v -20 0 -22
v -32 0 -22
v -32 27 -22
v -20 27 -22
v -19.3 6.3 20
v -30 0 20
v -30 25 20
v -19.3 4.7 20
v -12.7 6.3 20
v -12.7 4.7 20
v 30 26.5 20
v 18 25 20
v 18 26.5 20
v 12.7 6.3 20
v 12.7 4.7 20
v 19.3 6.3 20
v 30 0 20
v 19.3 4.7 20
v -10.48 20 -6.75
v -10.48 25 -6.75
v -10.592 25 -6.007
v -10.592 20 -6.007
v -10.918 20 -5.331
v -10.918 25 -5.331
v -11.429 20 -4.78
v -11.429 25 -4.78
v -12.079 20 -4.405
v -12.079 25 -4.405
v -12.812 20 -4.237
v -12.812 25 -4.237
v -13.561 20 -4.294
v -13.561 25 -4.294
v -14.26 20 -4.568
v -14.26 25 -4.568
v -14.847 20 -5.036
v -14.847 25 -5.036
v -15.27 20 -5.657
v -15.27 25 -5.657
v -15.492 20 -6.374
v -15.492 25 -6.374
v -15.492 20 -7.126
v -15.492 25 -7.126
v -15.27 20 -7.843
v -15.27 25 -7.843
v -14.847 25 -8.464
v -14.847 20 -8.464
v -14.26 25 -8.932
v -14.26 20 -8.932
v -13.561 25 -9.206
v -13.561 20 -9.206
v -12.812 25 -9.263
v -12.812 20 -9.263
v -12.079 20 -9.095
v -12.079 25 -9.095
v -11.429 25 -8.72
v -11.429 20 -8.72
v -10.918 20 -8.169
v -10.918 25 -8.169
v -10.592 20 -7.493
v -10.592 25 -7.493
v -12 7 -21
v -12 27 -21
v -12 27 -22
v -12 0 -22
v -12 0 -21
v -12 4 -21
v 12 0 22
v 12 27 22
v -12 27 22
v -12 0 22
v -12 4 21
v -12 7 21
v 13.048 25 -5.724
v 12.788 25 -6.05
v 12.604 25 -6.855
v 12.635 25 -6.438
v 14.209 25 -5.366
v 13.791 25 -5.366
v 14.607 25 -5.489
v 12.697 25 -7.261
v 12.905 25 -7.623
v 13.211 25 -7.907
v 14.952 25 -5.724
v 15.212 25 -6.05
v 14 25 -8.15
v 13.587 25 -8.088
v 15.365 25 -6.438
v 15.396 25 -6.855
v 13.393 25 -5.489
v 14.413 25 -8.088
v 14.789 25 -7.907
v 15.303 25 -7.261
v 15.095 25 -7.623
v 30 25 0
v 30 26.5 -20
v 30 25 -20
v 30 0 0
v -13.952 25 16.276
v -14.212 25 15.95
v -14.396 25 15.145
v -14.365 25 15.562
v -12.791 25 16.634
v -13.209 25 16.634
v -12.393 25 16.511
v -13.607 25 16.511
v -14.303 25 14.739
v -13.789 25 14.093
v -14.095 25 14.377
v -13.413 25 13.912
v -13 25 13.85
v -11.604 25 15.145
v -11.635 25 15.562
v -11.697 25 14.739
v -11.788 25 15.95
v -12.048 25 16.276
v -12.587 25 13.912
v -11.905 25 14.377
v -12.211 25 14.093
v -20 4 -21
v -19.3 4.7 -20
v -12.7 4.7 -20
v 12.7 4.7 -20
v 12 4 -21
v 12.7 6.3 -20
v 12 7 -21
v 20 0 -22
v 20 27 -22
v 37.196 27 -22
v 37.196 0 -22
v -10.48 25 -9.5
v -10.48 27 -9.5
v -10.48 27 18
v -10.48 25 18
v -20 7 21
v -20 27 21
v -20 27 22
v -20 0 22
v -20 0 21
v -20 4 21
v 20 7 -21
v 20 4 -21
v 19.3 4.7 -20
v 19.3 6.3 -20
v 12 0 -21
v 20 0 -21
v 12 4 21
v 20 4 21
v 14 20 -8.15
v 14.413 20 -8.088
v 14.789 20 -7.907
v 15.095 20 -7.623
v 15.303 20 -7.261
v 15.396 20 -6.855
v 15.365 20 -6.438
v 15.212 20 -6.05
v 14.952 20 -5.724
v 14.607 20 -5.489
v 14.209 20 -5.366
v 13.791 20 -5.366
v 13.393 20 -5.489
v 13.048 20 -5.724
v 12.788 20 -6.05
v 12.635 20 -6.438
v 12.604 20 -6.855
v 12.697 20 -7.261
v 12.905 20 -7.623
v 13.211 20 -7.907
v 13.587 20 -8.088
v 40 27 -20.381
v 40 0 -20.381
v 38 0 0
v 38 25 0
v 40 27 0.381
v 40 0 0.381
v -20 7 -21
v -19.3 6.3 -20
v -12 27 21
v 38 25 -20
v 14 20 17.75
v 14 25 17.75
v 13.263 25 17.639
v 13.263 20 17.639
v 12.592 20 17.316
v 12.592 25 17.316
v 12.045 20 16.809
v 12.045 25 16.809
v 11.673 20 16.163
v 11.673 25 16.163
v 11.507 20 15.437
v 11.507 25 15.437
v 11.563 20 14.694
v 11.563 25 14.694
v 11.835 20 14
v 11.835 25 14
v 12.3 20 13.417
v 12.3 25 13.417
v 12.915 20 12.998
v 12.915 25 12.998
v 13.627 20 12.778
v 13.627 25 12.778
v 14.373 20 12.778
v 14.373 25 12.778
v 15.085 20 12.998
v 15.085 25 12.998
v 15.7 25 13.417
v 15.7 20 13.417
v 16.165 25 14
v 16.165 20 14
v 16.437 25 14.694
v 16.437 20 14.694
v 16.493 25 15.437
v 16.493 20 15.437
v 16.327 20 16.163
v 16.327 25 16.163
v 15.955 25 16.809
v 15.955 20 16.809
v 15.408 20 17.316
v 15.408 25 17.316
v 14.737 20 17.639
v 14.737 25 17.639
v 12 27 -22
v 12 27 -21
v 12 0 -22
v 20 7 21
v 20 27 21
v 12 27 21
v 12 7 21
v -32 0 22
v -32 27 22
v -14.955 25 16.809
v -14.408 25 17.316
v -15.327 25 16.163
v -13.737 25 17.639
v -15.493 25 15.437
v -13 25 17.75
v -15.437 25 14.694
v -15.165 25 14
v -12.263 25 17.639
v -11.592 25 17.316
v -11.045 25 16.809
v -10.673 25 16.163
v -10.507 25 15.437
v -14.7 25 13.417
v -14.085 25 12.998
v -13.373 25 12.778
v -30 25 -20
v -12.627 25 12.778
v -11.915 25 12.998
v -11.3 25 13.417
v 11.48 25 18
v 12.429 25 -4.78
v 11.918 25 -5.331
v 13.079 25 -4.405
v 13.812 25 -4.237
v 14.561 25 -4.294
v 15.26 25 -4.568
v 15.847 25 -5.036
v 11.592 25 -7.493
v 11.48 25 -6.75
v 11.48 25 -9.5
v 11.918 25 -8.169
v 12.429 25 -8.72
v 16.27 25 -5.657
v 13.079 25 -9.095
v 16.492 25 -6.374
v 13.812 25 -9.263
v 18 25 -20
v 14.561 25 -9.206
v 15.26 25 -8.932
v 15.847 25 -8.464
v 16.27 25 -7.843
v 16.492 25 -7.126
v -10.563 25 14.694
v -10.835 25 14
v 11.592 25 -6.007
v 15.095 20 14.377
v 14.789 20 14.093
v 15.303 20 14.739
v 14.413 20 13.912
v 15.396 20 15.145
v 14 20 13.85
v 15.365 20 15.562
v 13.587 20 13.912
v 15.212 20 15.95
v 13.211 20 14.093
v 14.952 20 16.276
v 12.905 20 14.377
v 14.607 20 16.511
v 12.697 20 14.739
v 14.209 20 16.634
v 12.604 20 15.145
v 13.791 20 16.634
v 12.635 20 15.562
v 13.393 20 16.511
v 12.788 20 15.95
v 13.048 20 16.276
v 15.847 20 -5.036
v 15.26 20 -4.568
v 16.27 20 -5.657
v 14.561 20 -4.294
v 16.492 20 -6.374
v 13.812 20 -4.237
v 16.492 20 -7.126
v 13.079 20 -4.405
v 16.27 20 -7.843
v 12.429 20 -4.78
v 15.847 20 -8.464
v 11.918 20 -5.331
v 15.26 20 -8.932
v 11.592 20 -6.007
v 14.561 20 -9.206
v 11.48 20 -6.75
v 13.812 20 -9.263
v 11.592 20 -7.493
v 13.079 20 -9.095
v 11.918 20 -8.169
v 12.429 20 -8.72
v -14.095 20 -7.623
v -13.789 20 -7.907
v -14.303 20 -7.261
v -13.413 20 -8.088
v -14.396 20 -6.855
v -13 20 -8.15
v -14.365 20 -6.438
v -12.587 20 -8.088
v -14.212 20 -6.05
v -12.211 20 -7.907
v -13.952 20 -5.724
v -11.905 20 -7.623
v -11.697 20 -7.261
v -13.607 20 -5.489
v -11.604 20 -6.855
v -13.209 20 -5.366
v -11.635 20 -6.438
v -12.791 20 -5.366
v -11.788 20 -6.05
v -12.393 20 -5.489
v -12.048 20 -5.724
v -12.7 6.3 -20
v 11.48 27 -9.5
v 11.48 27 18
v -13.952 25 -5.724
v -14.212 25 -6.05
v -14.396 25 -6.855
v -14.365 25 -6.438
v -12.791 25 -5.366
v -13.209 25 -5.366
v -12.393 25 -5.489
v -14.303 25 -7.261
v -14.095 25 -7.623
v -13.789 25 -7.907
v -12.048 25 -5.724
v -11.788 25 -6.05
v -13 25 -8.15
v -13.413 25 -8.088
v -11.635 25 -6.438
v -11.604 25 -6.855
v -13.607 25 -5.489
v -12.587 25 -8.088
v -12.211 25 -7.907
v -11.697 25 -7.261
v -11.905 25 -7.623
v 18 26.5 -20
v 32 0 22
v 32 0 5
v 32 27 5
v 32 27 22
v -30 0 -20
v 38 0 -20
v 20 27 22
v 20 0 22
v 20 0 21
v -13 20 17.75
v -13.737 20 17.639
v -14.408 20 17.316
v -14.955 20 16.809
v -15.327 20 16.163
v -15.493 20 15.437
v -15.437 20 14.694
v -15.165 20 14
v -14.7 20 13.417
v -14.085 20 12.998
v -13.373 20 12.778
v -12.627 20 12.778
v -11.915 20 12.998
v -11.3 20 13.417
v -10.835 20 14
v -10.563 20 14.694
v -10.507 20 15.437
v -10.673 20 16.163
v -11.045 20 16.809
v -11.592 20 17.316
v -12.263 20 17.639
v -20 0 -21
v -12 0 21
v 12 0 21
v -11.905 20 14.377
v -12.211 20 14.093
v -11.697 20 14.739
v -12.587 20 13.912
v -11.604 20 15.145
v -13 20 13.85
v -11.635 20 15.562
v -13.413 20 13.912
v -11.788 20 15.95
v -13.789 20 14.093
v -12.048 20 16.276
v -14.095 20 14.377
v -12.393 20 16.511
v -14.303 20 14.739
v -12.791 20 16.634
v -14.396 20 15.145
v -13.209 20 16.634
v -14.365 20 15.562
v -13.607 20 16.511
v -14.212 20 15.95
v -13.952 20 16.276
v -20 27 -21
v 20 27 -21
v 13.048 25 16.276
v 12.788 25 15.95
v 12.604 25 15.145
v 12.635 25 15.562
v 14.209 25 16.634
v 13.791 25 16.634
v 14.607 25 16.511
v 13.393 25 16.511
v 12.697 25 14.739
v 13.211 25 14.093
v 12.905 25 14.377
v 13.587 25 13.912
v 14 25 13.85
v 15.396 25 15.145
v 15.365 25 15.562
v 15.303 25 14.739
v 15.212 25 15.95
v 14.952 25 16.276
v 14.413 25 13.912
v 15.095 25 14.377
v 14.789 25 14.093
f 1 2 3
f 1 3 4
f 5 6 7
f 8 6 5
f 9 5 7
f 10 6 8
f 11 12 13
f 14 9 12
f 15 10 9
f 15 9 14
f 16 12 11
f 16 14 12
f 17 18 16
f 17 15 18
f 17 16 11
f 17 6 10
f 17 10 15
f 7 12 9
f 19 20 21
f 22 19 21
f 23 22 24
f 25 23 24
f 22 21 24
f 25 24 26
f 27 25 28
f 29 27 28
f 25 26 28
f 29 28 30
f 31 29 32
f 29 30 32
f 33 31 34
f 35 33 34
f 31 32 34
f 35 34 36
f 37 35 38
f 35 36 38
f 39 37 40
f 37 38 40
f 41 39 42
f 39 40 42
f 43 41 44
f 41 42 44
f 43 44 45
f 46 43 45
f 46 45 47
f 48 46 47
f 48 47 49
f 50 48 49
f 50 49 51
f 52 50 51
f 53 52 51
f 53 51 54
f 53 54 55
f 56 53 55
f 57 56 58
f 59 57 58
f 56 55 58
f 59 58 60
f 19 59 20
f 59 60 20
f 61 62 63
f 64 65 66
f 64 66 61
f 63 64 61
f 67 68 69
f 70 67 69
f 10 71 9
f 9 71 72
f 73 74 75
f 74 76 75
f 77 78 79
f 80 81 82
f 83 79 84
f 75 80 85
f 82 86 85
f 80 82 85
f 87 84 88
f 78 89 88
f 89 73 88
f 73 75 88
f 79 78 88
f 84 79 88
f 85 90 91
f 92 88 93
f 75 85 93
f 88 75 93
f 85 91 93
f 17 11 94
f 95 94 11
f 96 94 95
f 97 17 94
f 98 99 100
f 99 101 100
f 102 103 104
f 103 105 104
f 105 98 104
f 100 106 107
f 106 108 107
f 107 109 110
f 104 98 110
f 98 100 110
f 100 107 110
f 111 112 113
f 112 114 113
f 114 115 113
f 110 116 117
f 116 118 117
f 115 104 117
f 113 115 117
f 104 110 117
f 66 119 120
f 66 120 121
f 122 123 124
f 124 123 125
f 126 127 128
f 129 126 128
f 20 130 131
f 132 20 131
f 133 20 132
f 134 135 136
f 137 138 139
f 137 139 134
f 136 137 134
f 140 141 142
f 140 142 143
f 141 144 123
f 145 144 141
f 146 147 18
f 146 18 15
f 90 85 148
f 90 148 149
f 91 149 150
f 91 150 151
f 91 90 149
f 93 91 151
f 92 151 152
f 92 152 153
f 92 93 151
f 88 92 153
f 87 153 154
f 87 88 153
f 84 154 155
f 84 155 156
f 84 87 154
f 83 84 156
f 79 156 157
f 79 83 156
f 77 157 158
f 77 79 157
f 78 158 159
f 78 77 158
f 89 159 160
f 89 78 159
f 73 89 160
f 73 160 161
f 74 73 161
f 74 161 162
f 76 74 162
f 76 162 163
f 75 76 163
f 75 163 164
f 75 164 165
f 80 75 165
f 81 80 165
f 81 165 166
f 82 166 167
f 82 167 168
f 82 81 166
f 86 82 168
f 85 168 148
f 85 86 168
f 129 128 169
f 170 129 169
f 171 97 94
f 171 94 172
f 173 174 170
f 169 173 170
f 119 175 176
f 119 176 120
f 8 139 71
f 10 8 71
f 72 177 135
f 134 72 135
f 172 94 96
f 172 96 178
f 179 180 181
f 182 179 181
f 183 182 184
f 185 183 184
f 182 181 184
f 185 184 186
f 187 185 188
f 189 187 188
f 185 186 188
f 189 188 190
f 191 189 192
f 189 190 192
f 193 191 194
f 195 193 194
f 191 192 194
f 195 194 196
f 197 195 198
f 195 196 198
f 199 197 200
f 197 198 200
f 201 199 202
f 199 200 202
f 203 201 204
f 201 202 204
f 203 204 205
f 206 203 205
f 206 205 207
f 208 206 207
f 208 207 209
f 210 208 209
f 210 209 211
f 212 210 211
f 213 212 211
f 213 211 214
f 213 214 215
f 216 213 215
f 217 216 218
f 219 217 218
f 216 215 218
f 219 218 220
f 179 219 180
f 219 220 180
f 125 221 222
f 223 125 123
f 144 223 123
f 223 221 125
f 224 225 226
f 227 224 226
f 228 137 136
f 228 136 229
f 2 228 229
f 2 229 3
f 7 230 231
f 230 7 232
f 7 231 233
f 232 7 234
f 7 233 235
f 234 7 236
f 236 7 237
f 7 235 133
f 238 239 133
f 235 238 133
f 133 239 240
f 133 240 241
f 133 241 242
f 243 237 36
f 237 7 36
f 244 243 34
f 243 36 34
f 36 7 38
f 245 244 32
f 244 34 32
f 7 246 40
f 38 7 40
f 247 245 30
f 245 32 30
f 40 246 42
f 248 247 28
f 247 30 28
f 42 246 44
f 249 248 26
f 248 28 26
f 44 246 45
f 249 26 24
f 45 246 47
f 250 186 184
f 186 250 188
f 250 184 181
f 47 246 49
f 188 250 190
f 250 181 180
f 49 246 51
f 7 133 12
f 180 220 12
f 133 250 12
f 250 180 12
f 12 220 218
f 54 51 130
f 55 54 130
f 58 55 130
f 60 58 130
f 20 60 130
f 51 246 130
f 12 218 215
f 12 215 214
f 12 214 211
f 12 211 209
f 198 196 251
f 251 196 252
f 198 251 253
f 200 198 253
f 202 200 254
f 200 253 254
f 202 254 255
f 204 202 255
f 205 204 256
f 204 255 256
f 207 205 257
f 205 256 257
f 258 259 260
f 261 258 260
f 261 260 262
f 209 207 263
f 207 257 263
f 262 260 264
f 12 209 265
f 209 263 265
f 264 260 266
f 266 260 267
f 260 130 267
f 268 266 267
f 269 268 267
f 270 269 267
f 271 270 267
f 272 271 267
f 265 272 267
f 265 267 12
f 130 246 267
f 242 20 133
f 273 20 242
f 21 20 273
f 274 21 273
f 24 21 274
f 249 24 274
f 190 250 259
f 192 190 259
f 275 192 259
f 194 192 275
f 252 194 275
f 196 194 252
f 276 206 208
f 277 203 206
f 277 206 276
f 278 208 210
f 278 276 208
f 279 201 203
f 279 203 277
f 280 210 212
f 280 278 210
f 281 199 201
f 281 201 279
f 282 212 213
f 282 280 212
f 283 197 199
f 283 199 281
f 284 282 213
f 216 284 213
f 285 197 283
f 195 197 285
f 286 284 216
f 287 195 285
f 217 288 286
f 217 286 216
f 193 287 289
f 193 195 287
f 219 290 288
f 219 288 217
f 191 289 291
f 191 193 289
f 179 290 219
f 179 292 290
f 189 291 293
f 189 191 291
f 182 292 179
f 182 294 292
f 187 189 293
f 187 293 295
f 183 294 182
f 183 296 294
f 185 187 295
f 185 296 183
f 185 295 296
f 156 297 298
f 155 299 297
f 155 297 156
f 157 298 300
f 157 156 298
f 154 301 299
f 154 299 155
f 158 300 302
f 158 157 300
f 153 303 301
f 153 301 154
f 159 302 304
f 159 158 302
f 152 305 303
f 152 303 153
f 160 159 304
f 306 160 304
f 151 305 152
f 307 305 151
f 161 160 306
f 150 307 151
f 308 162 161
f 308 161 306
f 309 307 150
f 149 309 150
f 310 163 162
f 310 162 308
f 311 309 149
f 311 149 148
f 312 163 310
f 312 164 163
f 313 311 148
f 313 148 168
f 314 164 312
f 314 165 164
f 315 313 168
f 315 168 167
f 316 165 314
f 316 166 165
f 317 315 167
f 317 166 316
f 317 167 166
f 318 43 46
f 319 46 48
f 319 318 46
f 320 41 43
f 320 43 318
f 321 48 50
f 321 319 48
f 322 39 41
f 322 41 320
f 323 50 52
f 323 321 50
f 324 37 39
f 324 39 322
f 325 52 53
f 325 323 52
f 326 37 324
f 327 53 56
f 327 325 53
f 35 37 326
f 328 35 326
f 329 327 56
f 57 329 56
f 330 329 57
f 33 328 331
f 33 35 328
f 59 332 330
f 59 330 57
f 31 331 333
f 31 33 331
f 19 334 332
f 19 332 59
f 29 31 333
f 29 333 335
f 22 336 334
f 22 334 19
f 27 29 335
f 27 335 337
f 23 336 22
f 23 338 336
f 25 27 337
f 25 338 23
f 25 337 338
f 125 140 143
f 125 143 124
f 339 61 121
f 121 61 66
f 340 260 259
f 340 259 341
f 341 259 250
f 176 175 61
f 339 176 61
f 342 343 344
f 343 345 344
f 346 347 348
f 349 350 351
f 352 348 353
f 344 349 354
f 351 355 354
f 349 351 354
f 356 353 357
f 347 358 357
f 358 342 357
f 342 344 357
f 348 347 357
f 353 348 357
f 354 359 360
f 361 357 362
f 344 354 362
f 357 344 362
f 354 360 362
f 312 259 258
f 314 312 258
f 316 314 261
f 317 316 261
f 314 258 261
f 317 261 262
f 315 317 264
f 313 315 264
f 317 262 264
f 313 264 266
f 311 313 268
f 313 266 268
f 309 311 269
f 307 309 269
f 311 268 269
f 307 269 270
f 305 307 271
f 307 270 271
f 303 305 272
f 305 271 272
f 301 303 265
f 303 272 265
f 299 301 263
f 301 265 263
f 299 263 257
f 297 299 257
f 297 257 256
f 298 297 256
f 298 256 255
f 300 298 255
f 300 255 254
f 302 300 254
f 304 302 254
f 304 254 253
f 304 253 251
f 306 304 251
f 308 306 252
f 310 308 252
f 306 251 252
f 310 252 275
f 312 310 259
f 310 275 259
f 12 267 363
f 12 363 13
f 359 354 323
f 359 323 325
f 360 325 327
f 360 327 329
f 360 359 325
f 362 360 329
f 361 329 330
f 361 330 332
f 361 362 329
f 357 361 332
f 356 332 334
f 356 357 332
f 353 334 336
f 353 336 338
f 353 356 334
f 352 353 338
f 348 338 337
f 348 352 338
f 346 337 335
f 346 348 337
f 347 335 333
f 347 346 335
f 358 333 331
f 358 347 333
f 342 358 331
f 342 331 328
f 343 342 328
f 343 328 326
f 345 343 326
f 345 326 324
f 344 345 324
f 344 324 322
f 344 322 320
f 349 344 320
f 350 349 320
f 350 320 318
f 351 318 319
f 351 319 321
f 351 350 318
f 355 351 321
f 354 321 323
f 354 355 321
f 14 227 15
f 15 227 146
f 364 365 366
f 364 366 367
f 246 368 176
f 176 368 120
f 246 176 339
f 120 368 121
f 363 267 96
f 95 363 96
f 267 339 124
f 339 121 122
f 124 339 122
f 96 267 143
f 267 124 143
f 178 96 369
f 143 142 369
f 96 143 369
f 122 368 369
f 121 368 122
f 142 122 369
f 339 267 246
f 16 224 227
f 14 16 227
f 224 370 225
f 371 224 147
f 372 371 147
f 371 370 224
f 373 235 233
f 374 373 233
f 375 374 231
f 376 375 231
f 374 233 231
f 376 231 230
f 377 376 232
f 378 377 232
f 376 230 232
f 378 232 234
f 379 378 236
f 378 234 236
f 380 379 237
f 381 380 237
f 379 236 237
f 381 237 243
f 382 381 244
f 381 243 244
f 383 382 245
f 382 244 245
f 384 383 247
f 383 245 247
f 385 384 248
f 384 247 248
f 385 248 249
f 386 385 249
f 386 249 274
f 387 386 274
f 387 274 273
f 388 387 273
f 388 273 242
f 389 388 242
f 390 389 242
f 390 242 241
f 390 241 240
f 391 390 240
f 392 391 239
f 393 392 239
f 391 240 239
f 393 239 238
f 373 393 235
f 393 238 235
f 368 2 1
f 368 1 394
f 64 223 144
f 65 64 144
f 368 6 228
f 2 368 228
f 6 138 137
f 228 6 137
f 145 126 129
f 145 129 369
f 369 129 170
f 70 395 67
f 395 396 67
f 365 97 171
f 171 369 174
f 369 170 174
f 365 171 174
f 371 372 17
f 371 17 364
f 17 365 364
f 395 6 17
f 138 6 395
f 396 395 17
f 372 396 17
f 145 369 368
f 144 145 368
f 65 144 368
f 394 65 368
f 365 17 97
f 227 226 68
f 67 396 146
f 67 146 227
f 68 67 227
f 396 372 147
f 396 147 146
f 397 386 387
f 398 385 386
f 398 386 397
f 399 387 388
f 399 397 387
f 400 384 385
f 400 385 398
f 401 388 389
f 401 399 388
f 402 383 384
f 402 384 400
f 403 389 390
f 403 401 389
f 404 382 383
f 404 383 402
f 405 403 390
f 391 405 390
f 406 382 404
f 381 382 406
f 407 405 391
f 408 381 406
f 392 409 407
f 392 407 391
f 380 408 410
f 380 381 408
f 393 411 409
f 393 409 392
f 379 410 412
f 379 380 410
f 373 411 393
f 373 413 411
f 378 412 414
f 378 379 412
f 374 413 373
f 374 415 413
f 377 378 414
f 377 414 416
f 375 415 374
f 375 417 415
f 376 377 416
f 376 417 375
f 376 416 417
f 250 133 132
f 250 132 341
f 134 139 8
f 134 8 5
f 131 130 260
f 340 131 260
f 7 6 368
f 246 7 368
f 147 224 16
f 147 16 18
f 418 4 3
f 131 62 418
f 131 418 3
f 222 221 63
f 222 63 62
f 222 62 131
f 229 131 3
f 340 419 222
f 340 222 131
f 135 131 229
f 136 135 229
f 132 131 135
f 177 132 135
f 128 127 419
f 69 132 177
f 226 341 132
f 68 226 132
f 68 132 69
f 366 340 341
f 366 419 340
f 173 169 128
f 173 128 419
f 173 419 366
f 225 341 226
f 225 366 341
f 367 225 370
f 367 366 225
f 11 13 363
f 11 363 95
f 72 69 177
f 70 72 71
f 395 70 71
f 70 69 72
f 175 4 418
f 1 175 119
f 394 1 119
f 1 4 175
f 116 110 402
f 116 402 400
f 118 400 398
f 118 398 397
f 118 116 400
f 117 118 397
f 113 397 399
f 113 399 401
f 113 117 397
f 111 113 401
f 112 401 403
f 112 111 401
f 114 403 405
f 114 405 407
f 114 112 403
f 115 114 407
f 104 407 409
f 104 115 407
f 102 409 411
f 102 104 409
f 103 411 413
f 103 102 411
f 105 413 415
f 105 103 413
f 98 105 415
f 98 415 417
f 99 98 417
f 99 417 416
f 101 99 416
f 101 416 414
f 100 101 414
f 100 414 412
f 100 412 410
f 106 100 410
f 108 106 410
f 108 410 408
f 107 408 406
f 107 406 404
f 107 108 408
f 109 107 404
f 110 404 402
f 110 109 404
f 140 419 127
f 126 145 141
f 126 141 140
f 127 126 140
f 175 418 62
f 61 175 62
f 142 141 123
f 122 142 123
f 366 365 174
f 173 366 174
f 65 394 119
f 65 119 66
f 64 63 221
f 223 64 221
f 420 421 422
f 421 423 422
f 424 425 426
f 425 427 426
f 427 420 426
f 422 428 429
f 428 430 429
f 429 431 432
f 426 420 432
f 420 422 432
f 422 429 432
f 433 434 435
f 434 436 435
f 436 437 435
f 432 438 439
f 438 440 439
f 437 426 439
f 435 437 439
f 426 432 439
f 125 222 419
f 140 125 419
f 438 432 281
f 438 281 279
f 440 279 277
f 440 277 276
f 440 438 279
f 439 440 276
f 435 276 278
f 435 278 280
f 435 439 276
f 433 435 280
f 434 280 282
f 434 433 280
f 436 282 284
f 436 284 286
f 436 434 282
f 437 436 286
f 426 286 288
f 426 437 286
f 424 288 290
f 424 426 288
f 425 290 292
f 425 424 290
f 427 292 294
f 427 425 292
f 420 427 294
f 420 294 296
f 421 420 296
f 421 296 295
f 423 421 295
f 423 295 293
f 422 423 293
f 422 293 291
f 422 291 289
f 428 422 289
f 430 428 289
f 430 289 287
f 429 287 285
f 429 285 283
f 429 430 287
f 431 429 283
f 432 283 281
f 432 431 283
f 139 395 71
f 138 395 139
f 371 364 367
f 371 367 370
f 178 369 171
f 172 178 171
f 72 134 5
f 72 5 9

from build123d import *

# Parameters (mm, degrees)
SKETCH1_W               = 60
SKETCH1_H               = 40
BOSS_EXTRUDE1_DEPTH     = 27
SKETCH2_W               = 8
SKETCH2_H               = 3
CUT_EXTRUDE1_DEPTH      = 1
CUT_EXTRUDE1_DRAFT      = -35
MIRROR1_COPY_1_SKETCH_W = 8
MIRROR1_COPY_1_SKETCH_H = 3
MIRROR1_COPY_1_DEPTH    = 1
MIRROR1_COPY_1_DRAFT    = -35
MIRROR2_COPY_1_SKETCH_W = 8
MIRROR2_COPY_1_SKETCH_H = 3
MIRROR2_COPY_1_DEPTH    = 1
MIRROR2_COPY_1_DRAFT    = -35
MIRROR2_COPY_2_SKETCH_W = 8
MIRROR2_COPY_2_SKETCH_H = 3
MIRROR2_COPY_2_DEPTH    = 1
MIRROR2_COPY_2_DRAFT    = -35
BOSS_EXTRUDE2_START     = 27
SKETCH1_3_W             = 60
SKETCH1_3_H             = 40
BOSS_EXTRUDE2_DEPTH     = 2
SKETCH3_W               = 21.960696684
SKETCH3_H               = 27.5
CUT_EXTRUDE2_DEPTH      = 2
SKETCH3_3_R             = 2.5
SKETCH3_3_R_2           = 1.4
SKETCH3_3_R_3           = 2.519651658
BOSS_EXTRUDE3_DEPTH     = 5
SKETCH4_W               = 20
SKETCH4_H               = 27
BOSS_EXTRUDE4_DEPTH     = 8
CHAMFER1_SIZE           = 5
CHAMFER1_SIZE_2         = 8.660254038
SKETCH5_W               = 8
SKETCH5_H               = 20
CUT_EXTRUDE3_DEPTH      = 25
SKETCH6_W               = 12
SKETCH6_H               = 40
CUT_EXTRUDE5_DEPTH      = 1.5


with BuildPart() as part:
    # Sketch1 → Boss-Extrude1 (new body)
    with BuildSketch(Plane(origin=(0, 0, 0), x_dir=(1, 0, 0), z_dir=(0, 1, 0))):
        Polygon((-32, 22), (-20, 22), (-20, 21), (-12, 21), (-12, 22), (12, 22), (12, 21), (20, 21), (20, 22), (32, 22), (32, -22), (20, -22), (20, -21), (12, -21), (12, -22), (-12, -22), (-12, -21), (-20, -21), (-20, -22), (-32, -22), align=None)
        Rectangle(SKETCH1_W, SKETCH1_H, mode=Mode.SUBTRACT)
    extrude(amount=BOSS_EXTRUDE1_DEPTH)


with BuildPart() as cut_extrude1_tool:
    # Sketch2 → Cut-Extrude1 (with draft: the straight prism first)
    with BuildSketch(Plane.XY.offset(21)):
        with Locations((-16, 5.5)):
            Rectangle(SKETCH2_W, SKETCH2_H)
    extrude(amount=-CUT_EXTRUDE1_DEPTH)
    # Cut-Extrude1: the draft: its side faces are tilted about the plane it starts from
    cut_extrude1_sides = [cut_extrude1_tool.faces().sort_by_distance(p)[0] for p in [
        (-20, 5.5, 20.5),
        (-16, 4, 20.5),
        (-12, 5.5, 20.5),
        (-16, 7, 20.5),
    ]]
    draft(cut_extrude1_sides, Plane.XY.offset(21), CUT_EXTRUDE1_DRAFT)


with BuildPart() as part_1:
    add(part.part)

    # Cut-Extrude1: cut by cut_extrude1_tool
    add(cut_extrude1_tool.part, mode=Mode.SUBTRACT)


with BuildPart() as mirror1_copy_1_tool:
    # Mirror1 copy 1 sketch → Mirror1 copy 1 (with draft: the straight prism first)
    with BuildSketch(Plane(origin=(0, 0, 21), x_dir=(-1, 0, 0), z_dir=(0, 0, 1))):
        with Locations((-16, -5.5)):
            Rectangle(MIRROR1_COPY_1_SKETCH_W, MIRROR1_COPY_1_SKETCH_H)
    extrude(amount=-MIRROR1_COPY_1_DEPTH)
    # Mirror1 copy 1: the draft: its side faces are tilted about the plane it starts from
    mirror1_copy_1_sides = [mirror1_copy_1_tool.faces().sort_by_distance(p)[0] for p in [
        (20, 5.5, 20.5),
        (16, 4, 20.5),
        (12, 5.5, 20.5),
        (16, 7, 20.5),
    ]]
    draft(mirror1_copy_1_sides, Plane(origin=(0, 0, 21), x_dir=(-1, 0, 0), z_dir=(0, 0, 1)), MIRROR1_COPY_1_DRAFT)


with BuildPart() as part_2:
    add(part_1.part)

    # Mirror1 copy 1: cut by mirror1_copy_1_tool
    add(mirror1_copy_1_tool.part, mode=Mode.SUBTRACT)


with BuildPart() as mirror2_copy_1_tool:
    # Mirror2 copy 1 sketch → Mirror2 copy 1 (with draft: the straight prism first)
    with BuildSketch(Plane(origin=(0, 0, -21), x_dir=(1, 0, 0), z_dir=(0, 0, -1))):
        with Locations((-16, -5.5)):
            Rectangle(MIRROR2_COPY_1_SKETCH_W, MIRROR2_COPY_1_SKETCH_H)
    extrude(amount=-MIRROR2_COPY_1_DEPTH)
    # Mirror2 copy 1: the draft: its side faces are tilted about the plane it starts from
    mirror2_copy_1_sides = [mirror2_copy_1_tool.faces().sort_by_distance(p)[0] for p in [
        (-20, 5.5, -20.5),
        (-16, 4, -20.5),
        (-12, 5.5, -20.5),
        (-16, 7, -20.5),
    ]]
    draft(mirror2_copy_1_sides, Plane(origin=(0, 0, -21), x_dir=(1, 0, 0), z_dir=(0, 0, -1)), MIRROR2_COPY_1_DRAFT)


with BuildPart() as part_3:
    add(part_2.part)

    # Mirror2 copy 1: cut by mirror2_copy_1_tool
    add(mirror2_copy_1_tool.part, mode=Mode.SUBTRACT)


with BuildPart() as mirror2_copy_2_tool:
    # Mirror2 copy 2 sketch → Mirror2 copy 2 (with draft: the straight prism first)
    with BuildSketch(Plane(origin=(0, 0, -21), x_dir=(-1, 0, 0), z_dir=(0, 0, -1))):
        with Locations((-16, 5.5)):
            Rectangle(MIRROR2_COPY_2_SKETCH_W, MIRROR2_COPY_2_SKETCH_H)
    extrude(amount=-MIRROR2_COPY_2_DEPTH)
    # Mirror2 copy 2: the draft: its side faces are tilted about the plane it starts from
    mirror2_copy_2_sides = [mirror2_copy_2_tool.faces().sort_by_distance(p)[0] for p in [
        (20, 5.5, -20.5),
        (16, 4, -20.5),
        (12, 5.5, -20.5),
        (16, 7, -20.5),
    ]]
    draft(mirror2_copy_2_sides, Plane(origin=(0, 0, -21), x_dir=(-1, 0, 0), z_dir=(0, 0, -1)), MIRROR2_COPY_2_DRAFT)


with BuildPart() as part_4:
    add(part_3.part)

    # Mirror2 copy 2: cut by mirror2_copy_2_tool
    add(mirror2_copy_2_tool.part, mode=Mode.SUBTRACT)

    # Sketch1<3> → Boss-Extrude2 (add)
    with BuildSketch(Plane(origin=(0, 0, 0), x_dir=(1, 0, 0), z_dir=(0, 1, 0)).offset(BOSS_EXTRUDE2_START)):
        Rectangle(SKETCH1_3_W, SKETCH1_3_H)
    extrude(amount=-BOSS_EXTRUDE2_DEPTH)

    # Sketch3 → Cut-Extrude2 (cut)
    with BuildSketch(Plane.XZ.offset(-25)):
        with Locations((0.5, 4.25)):
            Rectangle(SKETCH3_W, SKETCH3_H)
    extrude(amount=-CUT_EXTRUDE2_DEPTH, mode=Mode.SUBTRACT)

    # Sketch3<3> → Boss-Extrude3 (add)
    # profile 1 of 4: a face of its own
    with BuildSketch(Plane.XZ.offset(-25)):
        with Locations(Location((-13, 15.25, 0), (0, 0, 90))):
            Circle(SKETCH3_3_R)
        with Locations(Location((-13, 15.25, 0), (0, 0, 270))):
            Circle(SKETCH3_3_R_2, mode=Mode.SUBTRACT)
    # profile 2 of 4: a face of its own
    with BuildSketch(Plane.XZ.offset(-25)):
        with Locations((-13, -6.75)):
            Circle(SKETCH3_3_R_3)
        with Locations(Location((-13, -6.75, 0), (0, 0, 270))):
            Circle(SKETCH3_3_R_2, mode=Mode.SUBTRACT)
    # profile 3 of 4: a face of its own
    with BuildSketch(Plane.XZ.offset(-25)):
        with Locations(Location((14, -6.75, 0), (0, 0, 180))):
            Circle(SKETCH3_3_R_3)
        with Locations(Location((14, -6.75, 0), (0, 0, 270))):
            Circle(SKETCH3_3_R_2, mode=Mode.SUBTRACT)
    # profile 4 of 4: a face of its own
    with BuildSketch(Plane.XZ.offset(-25)):
        with Locations(Location((14, 15.25, 0), (0, 0, 90))):
            Circle(SKETCH3_3_R)
        with Locations(Location((14, 15.25, 0), (0, 0, 270))):
            Circle(SKETCH3_3_R_2, mode=Mode.SUBTRACT)
    extrude(amount=BOSS_EXTRUDE3_DEPTH)

    # Sketch4 → Boss-Extrude4 (add)
    with BuildSketch(Plane(origin=(32, 0, 0), x_dir=(0, 0, -1), z_dir=(1, 0, 0))):
        with Locations((10, 13.5)):
            Rectangle(SKETCH4_W, SKETCH4_H)
    extrude(amount=BOSS_EXTRUDE4_DEPTH)

    # Chamfer1
    # the kernel refuses this chamfer: 8.660254038, 5 mm, written as the material it adds along each edge
    with BuildSketch(Plane(origin=(32, 27, -20), x_dir=(-0.05789386240267251, 0, -0.9983227437537924), z_dir=(0, -1, 0))) as chamfer1_piece_1_section:
        Polygon((CHAMFER1_SIZE * 0.998322743754, CHAMFER1_SIZE * 0.0578938624027), (-CHAMFER1_SIZE_2 * 0.0578938624016, CHAMFER1_SIZE_2 * 0.998322743736), (0, 0), align=None)
    chamfer1_piece_1 = extrude(amount=27, mode=Mode.PRIVATE)
    chamfer1_piece_1 = split(chamfer1_piece_1, bisect_by=Plane(origin=(35.513912711, 13.5, -22), z_dir=(0, 0, 1)), keep=Keep.TOP, mode=Mode.PRIVATE)
    chamfer1_piece_1 = split(chamfer1_piece_1, bisect_by=Plane(origin=(40, 13.5, -20.824917772), z_dir=(-1, 0, 0)), keep=Keep.TOP, mode=Mode.PRIVATE)
    add(chamfer1_piece_1)
    with BuildSketch(Plane(origin=(32, 0, 0), x_dir=(-0.05789386240267113, 0, 0.9983227437537926), z_dir=(0, 1, 0))) as chamfer1_piece_2_section:
        Polygon((CHAMFER1_SIZE * 0.998322743754, CHAMFER1_SIZE * 0.0578938624027), (-CHAMFER1_SIZE_2 * 0.0578938624016, CHAMFER1_SIZE_2 * 0.998322743736), (0, 0), align=None)
    chamfer1_piece_2 = extrude(amount=27, mode=Mode.PRIVATE)
    chamfer1_piece_2 = split(chamfer1_piece_2, bisect_by=Plane(origin=(40, 13.5, 1.631661659), z_dir=(-1, 0, 0)), keep=Keep.TOP, mode=Mode.PRIVATE)
    add(chamfer1_piece_2)

    # Sketch5 → Cut-Extrude3 (cut)
    with BuildSketch(Plane.XZ):
        with Locations((34, -10)):
            Rectangle(SKETCH5_W, SKETCH5_H)
    extrude(amount=-CUT_EXTRUDE3_DEPTH, mode=Mode.SUBTRACT)

    # Sketch6 → Cut-Extrude5 (cut)
    with BuildSketch(Plane.XZ.offset(-25)):
        with Locations((24, 0)):
            Rectangle(SKETCH6_W, SKETCH6_H)
    extrude(amount=-CUT_EXTRUDE5_DEPTH, mode=Mode.SUBTRACT)


solid = part_4.part
